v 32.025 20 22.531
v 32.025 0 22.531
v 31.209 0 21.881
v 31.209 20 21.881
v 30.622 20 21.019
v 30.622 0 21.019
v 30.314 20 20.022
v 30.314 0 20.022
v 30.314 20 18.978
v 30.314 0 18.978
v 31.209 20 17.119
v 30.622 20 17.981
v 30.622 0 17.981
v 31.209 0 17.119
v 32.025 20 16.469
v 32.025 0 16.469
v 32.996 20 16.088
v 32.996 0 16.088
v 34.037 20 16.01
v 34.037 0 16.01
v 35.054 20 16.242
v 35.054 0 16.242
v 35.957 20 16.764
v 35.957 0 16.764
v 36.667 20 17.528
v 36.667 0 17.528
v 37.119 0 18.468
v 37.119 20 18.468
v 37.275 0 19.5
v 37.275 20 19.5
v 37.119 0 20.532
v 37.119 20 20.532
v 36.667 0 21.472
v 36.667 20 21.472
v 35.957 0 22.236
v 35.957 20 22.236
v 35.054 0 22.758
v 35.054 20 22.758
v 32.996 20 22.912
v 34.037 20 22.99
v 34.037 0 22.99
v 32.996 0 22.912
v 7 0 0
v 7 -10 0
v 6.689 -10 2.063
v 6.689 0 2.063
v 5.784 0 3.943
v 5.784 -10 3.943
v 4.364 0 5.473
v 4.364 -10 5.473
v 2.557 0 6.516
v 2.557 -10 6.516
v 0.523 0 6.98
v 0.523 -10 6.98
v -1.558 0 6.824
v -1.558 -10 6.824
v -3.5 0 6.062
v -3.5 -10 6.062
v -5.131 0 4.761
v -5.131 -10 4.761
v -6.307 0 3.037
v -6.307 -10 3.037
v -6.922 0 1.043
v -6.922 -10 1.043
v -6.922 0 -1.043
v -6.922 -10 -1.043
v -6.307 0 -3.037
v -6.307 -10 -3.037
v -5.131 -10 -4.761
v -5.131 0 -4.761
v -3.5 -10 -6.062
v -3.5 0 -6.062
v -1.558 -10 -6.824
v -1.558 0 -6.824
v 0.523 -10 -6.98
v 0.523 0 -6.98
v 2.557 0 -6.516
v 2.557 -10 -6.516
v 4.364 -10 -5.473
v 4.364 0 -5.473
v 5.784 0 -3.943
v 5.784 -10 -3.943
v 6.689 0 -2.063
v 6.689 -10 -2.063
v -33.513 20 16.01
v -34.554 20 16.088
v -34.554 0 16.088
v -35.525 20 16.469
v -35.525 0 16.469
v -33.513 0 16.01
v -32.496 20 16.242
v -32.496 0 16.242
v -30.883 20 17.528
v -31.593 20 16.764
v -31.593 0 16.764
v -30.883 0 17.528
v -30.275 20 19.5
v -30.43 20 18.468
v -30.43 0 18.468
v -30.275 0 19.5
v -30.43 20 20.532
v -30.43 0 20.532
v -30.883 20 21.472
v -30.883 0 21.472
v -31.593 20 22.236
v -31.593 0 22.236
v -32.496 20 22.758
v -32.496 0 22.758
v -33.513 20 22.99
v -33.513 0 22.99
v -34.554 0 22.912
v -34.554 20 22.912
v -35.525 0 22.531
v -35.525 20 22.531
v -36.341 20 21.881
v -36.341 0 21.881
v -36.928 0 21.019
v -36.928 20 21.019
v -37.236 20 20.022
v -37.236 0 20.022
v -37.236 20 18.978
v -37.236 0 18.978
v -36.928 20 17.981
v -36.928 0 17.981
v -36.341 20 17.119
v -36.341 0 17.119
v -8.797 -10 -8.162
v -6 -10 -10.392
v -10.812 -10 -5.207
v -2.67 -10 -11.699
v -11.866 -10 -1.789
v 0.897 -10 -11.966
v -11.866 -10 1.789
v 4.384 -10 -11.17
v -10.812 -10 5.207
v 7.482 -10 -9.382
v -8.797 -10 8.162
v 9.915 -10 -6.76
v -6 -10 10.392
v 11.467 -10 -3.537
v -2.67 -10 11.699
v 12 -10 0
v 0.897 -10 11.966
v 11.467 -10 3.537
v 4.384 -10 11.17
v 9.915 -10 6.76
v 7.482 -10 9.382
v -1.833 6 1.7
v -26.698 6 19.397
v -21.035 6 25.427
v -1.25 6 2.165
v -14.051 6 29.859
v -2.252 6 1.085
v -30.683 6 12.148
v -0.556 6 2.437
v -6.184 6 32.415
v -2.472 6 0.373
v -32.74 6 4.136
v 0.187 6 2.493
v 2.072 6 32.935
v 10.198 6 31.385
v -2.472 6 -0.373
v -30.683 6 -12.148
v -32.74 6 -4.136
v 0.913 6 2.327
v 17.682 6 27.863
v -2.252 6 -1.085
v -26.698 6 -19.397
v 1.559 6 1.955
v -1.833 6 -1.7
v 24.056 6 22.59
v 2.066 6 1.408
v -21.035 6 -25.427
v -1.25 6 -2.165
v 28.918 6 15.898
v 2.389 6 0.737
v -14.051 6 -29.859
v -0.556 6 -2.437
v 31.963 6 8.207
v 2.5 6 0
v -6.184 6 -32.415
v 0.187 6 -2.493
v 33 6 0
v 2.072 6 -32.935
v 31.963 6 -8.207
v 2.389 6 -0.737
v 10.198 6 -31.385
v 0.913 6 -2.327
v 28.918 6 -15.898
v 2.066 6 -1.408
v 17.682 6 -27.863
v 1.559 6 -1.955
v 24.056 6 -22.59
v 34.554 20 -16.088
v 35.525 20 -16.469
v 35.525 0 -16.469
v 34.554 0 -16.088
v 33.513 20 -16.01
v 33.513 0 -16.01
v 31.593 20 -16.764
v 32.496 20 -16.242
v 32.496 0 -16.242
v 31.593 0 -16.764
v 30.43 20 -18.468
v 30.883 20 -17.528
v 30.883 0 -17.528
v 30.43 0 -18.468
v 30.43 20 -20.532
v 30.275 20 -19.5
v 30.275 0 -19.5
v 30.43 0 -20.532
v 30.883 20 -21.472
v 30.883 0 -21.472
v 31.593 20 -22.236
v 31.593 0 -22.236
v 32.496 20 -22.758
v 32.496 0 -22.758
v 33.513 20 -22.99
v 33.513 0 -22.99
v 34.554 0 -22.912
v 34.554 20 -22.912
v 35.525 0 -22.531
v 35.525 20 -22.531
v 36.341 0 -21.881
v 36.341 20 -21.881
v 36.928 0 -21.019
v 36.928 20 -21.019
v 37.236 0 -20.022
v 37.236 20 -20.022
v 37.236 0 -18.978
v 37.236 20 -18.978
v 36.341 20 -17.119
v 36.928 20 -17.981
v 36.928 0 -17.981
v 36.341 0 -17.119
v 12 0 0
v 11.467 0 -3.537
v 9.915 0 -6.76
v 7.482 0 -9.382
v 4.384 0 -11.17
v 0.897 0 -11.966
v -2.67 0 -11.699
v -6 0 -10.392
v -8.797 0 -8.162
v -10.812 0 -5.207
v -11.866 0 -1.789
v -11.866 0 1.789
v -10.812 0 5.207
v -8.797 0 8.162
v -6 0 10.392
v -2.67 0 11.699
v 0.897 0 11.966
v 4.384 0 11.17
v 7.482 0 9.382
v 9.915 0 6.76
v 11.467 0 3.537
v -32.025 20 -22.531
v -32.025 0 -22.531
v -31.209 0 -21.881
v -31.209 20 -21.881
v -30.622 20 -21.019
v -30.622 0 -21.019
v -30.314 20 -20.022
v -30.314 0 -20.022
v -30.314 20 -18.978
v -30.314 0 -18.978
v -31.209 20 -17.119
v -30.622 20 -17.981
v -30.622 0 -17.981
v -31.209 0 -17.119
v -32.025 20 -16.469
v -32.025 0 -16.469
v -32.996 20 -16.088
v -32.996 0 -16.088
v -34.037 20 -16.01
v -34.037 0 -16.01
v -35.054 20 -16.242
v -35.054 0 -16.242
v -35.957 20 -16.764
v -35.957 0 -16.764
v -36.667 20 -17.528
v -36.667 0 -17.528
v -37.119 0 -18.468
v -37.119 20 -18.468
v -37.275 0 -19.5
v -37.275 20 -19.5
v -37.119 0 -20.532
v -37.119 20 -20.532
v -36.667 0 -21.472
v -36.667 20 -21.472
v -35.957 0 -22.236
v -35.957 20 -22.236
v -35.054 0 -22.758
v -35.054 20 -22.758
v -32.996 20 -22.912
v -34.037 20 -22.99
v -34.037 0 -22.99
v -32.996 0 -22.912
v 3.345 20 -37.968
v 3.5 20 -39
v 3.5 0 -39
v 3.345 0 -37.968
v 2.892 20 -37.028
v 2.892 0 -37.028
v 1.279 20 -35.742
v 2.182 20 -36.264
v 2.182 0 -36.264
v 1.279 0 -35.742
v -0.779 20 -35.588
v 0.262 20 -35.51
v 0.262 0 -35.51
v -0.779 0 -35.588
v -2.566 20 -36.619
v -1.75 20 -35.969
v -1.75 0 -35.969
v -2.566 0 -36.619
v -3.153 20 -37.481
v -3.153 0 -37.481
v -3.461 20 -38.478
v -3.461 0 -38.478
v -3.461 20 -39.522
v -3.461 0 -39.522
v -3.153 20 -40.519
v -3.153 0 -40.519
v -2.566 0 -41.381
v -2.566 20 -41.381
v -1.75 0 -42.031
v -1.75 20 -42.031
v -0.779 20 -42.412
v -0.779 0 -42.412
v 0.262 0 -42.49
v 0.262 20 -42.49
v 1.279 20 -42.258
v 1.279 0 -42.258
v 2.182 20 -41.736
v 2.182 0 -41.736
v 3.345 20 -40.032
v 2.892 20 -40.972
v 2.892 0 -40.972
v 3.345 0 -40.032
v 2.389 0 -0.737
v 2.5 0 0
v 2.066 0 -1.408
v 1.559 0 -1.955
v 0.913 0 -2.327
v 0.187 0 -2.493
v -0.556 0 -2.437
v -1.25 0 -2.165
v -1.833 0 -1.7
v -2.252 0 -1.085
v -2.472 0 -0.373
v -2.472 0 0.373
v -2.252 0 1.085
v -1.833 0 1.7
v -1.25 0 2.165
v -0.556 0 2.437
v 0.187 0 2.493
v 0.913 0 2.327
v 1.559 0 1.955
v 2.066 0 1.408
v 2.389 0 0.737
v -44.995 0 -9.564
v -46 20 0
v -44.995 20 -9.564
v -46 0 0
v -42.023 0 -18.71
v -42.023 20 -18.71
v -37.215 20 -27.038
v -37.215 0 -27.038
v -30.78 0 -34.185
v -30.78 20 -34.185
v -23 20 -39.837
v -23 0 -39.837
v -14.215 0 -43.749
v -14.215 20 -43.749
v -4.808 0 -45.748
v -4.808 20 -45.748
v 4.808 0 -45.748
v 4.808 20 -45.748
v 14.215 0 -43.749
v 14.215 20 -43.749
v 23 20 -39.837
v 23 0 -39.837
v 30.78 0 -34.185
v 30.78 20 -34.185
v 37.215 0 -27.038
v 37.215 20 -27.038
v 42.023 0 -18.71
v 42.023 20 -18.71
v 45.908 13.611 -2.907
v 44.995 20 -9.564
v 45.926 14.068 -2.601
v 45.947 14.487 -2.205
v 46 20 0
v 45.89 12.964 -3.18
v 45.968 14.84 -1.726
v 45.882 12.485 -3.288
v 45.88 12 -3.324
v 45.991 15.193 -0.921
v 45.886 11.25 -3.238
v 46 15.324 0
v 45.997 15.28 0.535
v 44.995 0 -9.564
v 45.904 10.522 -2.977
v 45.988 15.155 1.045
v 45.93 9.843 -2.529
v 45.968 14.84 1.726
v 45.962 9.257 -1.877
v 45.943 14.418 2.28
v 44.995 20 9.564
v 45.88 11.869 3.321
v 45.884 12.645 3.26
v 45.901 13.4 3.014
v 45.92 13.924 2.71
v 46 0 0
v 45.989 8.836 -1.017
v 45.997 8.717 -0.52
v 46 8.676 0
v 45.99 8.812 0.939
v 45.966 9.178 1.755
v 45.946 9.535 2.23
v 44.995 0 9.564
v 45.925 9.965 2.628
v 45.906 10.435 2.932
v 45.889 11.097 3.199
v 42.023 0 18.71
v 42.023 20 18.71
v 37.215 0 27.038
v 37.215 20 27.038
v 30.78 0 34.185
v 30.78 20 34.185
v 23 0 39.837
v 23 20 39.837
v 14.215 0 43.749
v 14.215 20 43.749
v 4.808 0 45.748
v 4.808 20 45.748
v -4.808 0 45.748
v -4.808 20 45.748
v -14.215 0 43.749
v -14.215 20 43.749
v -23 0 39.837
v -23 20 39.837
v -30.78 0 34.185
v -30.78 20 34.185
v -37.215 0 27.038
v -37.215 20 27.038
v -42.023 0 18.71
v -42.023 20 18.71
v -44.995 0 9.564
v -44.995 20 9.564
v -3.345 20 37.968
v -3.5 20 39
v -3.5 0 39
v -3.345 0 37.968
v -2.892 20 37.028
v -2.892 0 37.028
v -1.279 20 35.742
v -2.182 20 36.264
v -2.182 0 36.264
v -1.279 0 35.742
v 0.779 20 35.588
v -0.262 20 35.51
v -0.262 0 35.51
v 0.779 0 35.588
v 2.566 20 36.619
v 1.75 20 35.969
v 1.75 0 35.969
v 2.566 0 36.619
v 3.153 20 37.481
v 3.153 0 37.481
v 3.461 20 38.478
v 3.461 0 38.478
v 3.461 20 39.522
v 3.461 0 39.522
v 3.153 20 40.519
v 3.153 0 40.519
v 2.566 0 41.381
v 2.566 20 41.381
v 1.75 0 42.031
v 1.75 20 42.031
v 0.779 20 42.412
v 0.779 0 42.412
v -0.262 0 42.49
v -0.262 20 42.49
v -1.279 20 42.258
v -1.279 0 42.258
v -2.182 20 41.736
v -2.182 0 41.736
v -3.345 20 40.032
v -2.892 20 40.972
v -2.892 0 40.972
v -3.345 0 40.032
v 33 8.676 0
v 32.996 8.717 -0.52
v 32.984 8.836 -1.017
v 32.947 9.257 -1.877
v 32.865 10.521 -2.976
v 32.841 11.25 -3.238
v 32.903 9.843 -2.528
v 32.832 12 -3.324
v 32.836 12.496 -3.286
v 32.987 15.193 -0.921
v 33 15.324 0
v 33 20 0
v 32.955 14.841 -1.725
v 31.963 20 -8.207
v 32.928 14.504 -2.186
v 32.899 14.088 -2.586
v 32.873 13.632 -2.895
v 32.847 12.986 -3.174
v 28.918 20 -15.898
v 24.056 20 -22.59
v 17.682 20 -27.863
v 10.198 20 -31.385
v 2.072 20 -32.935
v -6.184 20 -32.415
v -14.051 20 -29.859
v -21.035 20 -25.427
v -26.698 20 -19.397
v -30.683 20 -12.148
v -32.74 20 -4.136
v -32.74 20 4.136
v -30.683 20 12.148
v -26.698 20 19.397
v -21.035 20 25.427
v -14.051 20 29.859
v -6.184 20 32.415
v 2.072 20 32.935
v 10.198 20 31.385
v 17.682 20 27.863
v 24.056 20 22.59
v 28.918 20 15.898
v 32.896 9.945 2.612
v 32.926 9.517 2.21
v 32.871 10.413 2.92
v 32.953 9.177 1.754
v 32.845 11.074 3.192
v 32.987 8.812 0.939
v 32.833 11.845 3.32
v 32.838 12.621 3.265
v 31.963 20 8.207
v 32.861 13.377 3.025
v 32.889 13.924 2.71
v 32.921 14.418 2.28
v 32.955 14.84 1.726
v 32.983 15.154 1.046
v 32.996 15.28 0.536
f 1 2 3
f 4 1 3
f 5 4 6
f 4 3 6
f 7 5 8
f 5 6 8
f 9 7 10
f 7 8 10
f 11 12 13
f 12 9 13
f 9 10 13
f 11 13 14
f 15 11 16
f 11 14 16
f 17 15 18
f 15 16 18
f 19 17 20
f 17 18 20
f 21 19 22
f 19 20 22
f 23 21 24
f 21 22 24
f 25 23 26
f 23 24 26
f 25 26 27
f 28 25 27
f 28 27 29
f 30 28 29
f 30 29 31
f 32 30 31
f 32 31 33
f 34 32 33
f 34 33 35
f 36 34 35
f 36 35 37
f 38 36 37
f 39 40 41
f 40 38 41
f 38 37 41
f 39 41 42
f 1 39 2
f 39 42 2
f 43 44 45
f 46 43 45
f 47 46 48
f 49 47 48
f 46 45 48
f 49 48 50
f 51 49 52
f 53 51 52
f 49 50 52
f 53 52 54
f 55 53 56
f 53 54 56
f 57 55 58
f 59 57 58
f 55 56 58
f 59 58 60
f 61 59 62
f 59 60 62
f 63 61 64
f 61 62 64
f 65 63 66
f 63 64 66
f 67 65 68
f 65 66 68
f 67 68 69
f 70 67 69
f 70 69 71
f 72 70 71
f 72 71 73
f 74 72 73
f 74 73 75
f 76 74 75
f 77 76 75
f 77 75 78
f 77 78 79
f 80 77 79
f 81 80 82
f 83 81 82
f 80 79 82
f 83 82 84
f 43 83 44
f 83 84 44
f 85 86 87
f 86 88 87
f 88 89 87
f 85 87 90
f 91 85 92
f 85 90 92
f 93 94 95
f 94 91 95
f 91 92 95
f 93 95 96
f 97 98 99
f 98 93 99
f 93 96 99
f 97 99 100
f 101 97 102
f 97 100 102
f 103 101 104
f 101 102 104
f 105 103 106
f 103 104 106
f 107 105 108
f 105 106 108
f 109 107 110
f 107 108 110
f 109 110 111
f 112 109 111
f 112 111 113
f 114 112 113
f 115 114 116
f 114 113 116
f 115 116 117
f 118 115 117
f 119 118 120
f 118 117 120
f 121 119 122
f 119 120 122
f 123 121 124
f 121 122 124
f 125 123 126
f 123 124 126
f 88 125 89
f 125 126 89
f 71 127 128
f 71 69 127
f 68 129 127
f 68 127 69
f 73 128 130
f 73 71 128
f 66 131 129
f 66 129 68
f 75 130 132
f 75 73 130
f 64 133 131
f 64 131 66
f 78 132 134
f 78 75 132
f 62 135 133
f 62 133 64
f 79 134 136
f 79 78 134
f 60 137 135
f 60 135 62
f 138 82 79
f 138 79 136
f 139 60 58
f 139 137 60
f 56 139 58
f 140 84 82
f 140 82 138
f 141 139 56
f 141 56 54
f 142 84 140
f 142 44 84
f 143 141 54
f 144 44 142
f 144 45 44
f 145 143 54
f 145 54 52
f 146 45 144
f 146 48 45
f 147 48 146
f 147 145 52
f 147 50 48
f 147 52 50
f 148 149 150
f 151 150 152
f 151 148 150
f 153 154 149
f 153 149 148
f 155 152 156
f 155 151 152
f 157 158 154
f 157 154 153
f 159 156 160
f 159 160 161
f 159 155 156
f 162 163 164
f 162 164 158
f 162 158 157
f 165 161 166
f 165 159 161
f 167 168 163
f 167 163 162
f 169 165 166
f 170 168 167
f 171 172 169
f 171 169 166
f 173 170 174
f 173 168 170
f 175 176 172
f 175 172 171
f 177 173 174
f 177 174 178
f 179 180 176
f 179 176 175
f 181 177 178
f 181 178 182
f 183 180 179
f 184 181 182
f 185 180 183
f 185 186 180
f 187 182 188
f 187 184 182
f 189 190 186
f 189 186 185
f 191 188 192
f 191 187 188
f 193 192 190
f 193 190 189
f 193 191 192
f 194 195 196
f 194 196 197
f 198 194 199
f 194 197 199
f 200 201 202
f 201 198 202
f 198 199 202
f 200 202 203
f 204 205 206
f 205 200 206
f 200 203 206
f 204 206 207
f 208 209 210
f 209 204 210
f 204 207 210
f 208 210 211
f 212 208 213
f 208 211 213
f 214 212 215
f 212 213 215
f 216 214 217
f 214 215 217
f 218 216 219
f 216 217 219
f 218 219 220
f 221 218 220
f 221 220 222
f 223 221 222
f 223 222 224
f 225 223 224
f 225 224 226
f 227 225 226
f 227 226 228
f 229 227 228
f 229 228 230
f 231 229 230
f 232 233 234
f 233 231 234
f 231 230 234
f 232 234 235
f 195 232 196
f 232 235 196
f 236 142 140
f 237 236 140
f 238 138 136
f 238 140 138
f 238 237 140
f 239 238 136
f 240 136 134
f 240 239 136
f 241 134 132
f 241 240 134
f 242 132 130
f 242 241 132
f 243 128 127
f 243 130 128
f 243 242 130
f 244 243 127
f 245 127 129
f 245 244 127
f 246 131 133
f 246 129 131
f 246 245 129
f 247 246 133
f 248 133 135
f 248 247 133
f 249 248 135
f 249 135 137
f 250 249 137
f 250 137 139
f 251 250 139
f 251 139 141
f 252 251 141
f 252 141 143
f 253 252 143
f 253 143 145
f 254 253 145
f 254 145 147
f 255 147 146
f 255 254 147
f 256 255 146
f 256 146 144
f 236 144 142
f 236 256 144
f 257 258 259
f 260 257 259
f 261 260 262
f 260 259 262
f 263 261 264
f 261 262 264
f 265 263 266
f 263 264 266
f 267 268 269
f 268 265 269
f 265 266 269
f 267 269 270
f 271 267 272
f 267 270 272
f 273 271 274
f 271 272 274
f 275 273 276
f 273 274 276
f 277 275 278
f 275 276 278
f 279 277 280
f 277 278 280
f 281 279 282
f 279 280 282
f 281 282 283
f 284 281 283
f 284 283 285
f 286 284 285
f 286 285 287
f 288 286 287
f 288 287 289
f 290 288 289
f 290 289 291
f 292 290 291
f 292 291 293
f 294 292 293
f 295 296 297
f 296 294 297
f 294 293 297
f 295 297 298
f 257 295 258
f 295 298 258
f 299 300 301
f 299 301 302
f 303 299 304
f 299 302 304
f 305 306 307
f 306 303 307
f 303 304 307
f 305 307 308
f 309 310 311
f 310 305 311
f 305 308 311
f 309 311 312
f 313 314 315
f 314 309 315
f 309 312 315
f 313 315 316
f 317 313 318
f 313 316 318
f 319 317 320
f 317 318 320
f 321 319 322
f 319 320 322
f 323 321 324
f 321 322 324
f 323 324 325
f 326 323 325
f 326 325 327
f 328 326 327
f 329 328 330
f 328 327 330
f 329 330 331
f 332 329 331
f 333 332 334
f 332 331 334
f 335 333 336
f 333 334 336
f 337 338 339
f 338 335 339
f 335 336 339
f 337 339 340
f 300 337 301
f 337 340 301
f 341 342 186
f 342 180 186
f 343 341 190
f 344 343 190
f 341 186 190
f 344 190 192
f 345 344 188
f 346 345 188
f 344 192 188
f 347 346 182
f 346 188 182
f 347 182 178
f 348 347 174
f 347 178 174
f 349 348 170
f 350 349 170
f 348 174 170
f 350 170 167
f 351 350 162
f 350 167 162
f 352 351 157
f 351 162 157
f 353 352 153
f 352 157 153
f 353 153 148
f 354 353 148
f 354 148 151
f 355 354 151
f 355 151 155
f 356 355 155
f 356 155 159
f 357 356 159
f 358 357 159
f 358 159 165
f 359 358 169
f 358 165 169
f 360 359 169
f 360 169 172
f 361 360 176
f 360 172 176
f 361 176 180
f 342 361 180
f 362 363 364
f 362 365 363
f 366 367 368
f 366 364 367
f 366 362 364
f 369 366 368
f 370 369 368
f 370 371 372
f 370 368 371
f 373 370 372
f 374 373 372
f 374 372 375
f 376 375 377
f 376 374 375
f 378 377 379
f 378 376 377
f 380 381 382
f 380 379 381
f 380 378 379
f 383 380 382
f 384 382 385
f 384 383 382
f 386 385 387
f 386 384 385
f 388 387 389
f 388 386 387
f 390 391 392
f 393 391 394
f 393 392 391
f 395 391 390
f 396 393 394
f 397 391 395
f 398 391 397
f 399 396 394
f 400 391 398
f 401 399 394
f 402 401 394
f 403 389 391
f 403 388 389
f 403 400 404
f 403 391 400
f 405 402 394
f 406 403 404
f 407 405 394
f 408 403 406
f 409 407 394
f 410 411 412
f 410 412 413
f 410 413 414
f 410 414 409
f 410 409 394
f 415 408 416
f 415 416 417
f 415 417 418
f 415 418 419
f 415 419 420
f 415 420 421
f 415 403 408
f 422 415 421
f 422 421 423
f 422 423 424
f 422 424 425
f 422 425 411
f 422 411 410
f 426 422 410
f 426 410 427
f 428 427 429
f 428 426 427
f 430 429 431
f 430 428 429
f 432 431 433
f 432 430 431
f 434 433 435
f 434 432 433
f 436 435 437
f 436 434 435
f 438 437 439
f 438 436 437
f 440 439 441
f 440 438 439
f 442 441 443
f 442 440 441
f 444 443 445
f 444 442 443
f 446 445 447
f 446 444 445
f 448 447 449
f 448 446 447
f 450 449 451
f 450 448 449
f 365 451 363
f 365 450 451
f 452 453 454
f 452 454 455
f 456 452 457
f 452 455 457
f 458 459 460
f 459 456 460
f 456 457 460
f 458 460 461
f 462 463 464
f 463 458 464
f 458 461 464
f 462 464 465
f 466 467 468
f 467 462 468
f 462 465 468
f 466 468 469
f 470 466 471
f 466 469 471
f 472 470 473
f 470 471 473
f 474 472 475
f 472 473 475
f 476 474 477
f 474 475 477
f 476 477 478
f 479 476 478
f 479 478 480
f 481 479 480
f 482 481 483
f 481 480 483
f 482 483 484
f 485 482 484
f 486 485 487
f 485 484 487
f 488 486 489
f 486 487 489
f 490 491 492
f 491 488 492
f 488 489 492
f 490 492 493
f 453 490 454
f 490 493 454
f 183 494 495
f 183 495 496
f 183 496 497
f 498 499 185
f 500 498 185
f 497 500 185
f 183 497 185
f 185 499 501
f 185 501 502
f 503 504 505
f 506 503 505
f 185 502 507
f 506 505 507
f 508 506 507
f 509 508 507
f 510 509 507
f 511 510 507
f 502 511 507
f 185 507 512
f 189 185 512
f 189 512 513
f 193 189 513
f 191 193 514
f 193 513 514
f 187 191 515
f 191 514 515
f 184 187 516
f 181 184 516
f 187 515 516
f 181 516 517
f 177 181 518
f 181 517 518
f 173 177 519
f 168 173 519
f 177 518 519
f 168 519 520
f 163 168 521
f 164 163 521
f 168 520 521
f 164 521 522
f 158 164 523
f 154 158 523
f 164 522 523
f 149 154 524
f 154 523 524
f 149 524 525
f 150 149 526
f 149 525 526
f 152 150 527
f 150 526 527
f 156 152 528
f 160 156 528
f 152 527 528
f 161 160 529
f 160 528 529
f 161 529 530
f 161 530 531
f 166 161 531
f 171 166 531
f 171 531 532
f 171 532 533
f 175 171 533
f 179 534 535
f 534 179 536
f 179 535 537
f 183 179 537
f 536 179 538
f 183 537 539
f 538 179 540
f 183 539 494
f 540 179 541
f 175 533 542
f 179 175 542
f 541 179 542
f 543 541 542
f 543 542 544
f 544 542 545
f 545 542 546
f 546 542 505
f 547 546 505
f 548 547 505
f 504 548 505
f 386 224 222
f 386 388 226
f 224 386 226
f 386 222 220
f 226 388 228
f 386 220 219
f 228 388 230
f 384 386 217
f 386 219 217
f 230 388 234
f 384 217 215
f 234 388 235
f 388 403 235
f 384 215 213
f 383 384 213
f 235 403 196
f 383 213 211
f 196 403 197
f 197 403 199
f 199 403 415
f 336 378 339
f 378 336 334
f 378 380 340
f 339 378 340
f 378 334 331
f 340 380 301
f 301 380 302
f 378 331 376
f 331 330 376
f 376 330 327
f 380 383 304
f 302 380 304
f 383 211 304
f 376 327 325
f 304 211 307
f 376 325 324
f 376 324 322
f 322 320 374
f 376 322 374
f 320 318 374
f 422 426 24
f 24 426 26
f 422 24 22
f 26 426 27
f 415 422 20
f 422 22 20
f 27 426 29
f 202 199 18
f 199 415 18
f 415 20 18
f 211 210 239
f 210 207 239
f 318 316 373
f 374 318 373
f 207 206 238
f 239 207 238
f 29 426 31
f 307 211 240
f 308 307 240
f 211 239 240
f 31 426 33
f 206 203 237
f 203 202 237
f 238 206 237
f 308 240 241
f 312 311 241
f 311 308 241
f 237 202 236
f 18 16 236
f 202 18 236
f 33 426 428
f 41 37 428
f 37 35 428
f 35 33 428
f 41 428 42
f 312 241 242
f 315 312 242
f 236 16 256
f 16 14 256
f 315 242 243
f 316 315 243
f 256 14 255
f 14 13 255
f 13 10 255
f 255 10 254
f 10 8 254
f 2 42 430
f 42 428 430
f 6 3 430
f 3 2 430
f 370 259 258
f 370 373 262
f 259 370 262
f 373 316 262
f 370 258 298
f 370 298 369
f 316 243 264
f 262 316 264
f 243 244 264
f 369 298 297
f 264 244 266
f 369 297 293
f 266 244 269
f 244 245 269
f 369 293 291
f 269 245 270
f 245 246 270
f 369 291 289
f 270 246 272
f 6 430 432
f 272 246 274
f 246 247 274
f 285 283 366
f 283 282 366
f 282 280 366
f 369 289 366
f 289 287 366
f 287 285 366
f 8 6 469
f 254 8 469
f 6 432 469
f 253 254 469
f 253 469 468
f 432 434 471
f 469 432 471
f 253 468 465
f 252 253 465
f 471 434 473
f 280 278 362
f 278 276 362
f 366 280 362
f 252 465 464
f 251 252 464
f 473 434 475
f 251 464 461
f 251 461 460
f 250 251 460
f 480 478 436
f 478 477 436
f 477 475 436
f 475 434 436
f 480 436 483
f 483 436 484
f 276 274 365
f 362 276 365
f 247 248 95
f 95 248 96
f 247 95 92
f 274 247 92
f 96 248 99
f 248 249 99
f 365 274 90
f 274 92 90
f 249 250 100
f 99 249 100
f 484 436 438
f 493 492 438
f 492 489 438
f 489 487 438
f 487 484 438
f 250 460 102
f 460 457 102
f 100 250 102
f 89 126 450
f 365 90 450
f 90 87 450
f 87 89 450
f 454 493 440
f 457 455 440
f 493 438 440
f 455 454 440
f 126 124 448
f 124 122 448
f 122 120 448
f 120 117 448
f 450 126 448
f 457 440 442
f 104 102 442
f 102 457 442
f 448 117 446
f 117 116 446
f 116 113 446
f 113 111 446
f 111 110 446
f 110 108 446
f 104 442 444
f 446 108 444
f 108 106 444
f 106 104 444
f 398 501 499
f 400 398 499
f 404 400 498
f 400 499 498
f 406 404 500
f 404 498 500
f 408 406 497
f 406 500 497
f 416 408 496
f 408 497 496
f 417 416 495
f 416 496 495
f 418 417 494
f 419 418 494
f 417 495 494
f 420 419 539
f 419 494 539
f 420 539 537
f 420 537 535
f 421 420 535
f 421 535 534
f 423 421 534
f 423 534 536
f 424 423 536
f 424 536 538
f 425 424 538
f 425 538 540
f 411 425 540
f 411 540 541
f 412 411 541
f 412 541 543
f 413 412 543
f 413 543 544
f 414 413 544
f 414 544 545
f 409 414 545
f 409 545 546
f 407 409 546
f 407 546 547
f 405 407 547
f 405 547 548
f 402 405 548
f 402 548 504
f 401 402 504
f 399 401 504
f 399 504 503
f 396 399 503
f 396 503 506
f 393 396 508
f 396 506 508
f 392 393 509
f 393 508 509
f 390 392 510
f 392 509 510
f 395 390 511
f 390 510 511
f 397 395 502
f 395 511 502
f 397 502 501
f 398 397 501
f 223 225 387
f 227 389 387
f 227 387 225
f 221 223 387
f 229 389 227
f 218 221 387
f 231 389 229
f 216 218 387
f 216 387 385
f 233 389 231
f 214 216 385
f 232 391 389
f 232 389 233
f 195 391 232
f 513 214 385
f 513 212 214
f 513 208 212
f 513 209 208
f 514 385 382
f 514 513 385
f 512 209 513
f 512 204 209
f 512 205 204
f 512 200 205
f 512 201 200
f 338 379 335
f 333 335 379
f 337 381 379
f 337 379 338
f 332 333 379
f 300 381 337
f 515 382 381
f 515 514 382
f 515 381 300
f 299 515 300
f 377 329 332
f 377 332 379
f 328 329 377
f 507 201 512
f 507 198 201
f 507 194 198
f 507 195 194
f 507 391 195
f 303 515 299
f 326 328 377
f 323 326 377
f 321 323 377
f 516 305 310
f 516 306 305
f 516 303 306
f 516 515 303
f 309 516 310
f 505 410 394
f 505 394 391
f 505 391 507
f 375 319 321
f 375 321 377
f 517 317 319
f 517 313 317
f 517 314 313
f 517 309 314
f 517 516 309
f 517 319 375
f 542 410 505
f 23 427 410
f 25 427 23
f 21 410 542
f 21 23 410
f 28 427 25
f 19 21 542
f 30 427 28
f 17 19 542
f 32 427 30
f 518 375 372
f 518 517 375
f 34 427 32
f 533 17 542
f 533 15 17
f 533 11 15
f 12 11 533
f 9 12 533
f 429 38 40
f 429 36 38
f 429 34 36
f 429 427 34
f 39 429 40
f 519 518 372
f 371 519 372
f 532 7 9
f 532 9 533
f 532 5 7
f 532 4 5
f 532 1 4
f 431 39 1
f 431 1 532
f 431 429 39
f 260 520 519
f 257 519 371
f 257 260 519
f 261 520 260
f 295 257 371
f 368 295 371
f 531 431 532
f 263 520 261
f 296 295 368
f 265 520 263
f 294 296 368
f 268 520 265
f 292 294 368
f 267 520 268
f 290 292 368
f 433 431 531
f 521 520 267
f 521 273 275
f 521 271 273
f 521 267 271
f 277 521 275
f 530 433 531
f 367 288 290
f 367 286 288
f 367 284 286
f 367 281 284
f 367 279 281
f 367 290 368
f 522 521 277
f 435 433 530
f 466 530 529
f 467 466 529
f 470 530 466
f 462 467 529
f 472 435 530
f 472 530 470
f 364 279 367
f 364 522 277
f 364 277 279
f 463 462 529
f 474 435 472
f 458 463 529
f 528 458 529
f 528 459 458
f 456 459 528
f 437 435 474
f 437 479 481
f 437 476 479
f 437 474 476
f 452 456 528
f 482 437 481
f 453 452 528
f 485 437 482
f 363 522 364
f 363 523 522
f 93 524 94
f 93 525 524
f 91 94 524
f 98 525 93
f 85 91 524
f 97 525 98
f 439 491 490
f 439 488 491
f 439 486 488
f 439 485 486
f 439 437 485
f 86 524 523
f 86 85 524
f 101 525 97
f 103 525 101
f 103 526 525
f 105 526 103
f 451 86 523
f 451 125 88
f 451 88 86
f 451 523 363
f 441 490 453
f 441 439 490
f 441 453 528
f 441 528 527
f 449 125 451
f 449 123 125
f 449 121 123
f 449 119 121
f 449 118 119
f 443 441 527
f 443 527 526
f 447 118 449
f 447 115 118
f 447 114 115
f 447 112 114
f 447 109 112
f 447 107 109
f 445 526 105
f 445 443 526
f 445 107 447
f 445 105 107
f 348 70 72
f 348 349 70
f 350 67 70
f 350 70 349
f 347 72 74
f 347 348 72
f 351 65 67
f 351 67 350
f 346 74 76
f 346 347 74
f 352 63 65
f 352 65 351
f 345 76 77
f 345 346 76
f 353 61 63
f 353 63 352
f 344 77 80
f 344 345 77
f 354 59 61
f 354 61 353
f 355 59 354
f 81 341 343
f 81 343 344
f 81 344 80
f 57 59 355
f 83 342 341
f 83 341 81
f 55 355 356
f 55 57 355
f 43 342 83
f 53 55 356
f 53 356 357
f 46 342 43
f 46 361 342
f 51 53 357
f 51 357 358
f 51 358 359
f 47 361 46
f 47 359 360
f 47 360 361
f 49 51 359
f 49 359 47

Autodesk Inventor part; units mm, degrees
ref_plane "XZ Plane" through (0, 0, 0) normal (0, 1, 0) x (-1, 0, 0)
ref_plane "XY Plane" through (0, 0, 0) normal (0, 0, 1) x (1, 0, 0)
sketch "Sketch1" plane through (0, 0, 0) normal (0, 1, 0) x (-1, 0, 0)
  circle A0 centre (0, 0) radius 46
  dimension "d0" = 92
extrude "Extrusion1" add sketch "Sketch1" along normal blind 20
sketch "Sketch2" plane through (0, 20, 0) normal (0, 1, 0) x (1, 0, 0)
  circle A0 centre (0, 0) radius 33
  dimension "d3" = 66
extrude "Extrusion2" cut sketch "Sketch2" against normal blind 14
sketch "Sketch3" plane through (0, 6, 0) normal (0, 1, 0) x (1, 0, 0)
  circle A0 centre (0, 0) radius 2.5
  dimension "d6" = 5
extrude "Extrusion3" cut sketch "Sketch3" against normal blind 6
sketch "Sketch4" plane through (0, 0, 0) normal (0, -1, 0) x (1, 0, 0)
  circle A0 centre (0, 0) radius 12
  dimension "d9" = 24
extrude "Extrusion4" add sketch "Sketch4" along normal blind 10
sketch "Sketch5" plane through (0, 0, 0) normal (0, -1, 0) x (1, 0, 0)
  circle A0 centre (0, 0) radius 2.5 projected
  line L0 (0, 0) -> (0, -39)
  circle A1 centre (0, -39) radius 3.5
  dimension "d12" = 39
  dimension "d13" = 7
extrude "Extrusion5" cut sketch "Sketch5" against normal blind 20 contours A1
pattern_circular "Circular Pattern1" count 6 over 360 about axis through (0, 0, 0) along (0, -1, 0) of "Extrusion5"
sketch "Sketch6" plane through (0, -10, 0) normal (0, -1, 0) x (1, 0, 0)
  circle A0 centre (0, 0) radius 2.5 projected
  circle A1 centre (0, 0) radius 7
  dimension "d19" = 14
extrude "Extrusion6" cut sketch "Sketch6" against normal blind 10 contours A0 | A1
ref_plane "Work Plane2" through (46, 0, 0) normal (1, 0, 0) x (0, 1, 0)
sketch "Sketch8" plane through (46, 0, 0) normal (1, 0, 0) x (0, 1, 0)
  point P0 (0, 0)
  point P1 (12, 0)
  point P2 (12, 0)
hole "Hole1" at (46, 12, 0) direction (-1, 0, 0) diameter 6.647 depth 22.2 tip angle 118 thread size "M8x1.25" class "6H" standard "ISO Metric profile"
properties part number "valve housing"
